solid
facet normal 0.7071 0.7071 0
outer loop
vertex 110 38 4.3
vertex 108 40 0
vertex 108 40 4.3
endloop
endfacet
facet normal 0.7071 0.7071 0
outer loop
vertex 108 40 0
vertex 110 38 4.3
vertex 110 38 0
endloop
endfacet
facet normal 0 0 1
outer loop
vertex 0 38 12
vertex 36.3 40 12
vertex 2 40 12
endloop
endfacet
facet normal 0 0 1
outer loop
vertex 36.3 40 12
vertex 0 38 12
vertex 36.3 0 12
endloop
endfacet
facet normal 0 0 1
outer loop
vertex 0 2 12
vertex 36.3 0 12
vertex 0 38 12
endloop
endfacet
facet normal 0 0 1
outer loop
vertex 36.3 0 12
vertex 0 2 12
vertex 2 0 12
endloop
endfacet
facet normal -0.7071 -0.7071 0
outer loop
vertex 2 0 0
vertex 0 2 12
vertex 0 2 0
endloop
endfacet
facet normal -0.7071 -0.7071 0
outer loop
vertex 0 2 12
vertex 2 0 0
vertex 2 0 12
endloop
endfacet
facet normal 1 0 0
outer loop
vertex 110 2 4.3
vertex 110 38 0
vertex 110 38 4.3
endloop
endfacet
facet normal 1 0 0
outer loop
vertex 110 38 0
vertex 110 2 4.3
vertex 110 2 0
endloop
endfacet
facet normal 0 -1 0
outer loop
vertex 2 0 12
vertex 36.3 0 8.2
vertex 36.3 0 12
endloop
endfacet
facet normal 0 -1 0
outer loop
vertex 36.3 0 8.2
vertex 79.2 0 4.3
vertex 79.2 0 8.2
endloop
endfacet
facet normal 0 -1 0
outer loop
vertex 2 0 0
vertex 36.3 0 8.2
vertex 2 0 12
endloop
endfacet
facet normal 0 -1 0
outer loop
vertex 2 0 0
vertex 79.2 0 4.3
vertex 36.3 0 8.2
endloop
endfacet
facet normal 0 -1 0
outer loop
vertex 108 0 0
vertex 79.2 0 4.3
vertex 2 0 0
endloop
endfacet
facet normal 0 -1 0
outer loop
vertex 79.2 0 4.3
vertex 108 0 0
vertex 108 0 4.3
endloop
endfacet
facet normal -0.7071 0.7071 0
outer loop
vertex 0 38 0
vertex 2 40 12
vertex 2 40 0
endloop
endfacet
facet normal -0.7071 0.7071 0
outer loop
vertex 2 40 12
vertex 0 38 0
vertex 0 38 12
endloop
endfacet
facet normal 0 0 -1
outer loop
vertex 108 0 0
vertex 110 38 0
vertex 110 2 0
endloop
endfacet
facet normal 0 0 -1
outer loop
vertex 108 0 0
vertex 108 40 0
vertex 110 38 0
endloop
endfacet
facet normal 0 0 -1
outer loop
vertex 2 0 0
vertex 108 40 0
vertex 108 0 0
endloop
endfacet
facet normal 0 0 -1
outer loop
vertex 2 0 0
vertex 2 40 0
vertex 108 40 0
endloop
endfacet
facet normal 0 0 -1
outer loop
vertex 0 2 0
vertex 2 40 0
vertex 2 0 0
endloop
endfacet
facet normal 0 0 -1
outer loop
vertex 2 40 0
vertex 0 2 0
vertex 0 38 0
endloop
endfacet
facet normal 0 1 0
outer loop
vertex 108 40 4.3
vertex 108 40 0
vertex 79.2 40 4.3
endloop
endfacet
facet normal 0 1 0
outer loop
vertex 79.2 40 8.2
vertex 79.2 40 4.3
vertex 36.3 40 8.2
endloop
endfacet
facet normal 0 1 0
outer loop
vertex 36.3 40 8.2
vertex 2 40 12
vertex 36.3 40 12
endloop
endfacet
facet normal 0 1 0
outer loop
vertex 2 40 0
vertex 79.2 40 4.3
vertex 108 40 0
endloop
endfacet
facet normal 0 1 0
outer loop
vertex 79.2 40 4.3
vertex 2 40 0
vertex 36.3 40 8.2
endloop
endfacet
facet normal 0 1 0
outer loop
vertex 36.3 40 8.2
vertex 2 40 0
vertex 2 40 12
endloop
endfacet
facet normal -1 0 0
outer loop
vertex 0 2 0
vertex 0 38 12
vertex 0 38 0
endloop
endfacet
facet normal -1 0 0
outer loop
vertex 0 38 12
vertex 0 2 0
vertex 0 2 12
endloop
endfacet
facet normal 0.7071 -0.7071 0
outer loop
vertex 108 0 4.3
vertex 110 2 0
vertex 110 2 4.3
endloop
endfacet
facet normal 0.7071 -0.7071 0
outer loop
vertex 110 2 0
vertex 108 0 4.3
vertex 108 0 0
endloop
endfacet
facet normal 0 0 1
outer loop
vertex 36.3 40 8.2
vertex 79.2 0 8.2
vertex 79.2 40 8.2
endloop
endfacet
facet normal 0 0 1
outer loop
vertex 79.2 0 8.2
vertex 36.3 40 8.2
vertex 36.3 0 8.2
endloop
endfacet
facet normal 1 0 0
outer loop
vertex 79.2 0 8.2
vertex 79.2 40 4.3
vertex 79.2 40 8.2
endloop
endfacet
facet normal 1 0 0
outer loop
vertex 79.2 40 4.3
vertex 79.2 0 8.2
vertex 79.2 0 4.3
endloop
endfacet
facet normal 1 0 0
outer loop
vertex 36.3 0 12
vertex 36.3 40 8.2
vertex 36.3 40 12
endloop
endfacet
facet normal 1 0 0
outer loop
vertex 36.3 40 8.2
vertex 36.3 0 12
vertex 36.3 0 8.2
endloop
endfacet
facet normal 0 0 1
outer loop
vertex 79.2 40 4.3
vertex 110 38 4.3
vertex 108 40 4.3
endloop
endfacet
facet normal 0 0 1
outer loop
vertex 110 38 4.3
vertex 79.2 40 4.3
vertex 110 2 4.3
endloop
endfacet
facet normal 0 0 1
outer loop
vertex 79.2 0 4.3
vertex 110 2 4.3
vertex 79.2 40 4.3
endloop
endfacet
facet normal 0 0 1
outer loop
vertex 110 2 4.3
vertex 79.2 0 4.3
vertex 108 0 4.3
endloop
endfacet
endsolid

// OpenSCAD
$fn = 32;

// ----------------------------------------------------------------------
// Stepped bar: twostep, 110 x 40 x 12/4.3 mm
// ----------------------------------------------------------------------

// --- parameters (mm) ---
bar_l = 110;              // bar length, X
bar_w = 40;               // bar width, Y
plate_t = 12;             // thickness of the thick zone, Z
thin_t = 4.3;             // thickness of the thin zone
corner_c = 2;             // corner chamfer of the bar
step_cut = 7.7;           // material removed from the thin zone
stair1_x = 36.3;          // position of the first stair
stair2_x = 79.2;          // position of the second stair
mid_t = 8.2;              // thickness of the middle zone
depth_1 = 3.8;            // depth of cut 1 from the top face
depth_2 = 7.7;            // depth of cut 2 from the top face

profile = [[2, 0], [108, 0], [110, 2], [110, 38], [108, 40], [2, 40], [0, 38], [0, 2]];  // primary outline, 8 points, counter clockwise
void_1 = [[36.3, -1], [79.2, -1], [79.2, 41], [36.3, 41]];  // first stair, 4 points
void_2 = [[79.2, -1], [111, -1], [111, 41], [79.2, 41]];  // second stair, 4 points

// --- the one profile operation ---
difference() {
  linear_extrude(height = plate_t) polygon(points = profile);
  translate([0, 0, plate_t - depth_1])
    linear_extrude(height = depth_1 + 1) polygon(points = void_1);
  translate([0, 0, plate_t - depth_2])
    linear_extrude(height = depth_2 + 1) polygon(points = void_2);
}
